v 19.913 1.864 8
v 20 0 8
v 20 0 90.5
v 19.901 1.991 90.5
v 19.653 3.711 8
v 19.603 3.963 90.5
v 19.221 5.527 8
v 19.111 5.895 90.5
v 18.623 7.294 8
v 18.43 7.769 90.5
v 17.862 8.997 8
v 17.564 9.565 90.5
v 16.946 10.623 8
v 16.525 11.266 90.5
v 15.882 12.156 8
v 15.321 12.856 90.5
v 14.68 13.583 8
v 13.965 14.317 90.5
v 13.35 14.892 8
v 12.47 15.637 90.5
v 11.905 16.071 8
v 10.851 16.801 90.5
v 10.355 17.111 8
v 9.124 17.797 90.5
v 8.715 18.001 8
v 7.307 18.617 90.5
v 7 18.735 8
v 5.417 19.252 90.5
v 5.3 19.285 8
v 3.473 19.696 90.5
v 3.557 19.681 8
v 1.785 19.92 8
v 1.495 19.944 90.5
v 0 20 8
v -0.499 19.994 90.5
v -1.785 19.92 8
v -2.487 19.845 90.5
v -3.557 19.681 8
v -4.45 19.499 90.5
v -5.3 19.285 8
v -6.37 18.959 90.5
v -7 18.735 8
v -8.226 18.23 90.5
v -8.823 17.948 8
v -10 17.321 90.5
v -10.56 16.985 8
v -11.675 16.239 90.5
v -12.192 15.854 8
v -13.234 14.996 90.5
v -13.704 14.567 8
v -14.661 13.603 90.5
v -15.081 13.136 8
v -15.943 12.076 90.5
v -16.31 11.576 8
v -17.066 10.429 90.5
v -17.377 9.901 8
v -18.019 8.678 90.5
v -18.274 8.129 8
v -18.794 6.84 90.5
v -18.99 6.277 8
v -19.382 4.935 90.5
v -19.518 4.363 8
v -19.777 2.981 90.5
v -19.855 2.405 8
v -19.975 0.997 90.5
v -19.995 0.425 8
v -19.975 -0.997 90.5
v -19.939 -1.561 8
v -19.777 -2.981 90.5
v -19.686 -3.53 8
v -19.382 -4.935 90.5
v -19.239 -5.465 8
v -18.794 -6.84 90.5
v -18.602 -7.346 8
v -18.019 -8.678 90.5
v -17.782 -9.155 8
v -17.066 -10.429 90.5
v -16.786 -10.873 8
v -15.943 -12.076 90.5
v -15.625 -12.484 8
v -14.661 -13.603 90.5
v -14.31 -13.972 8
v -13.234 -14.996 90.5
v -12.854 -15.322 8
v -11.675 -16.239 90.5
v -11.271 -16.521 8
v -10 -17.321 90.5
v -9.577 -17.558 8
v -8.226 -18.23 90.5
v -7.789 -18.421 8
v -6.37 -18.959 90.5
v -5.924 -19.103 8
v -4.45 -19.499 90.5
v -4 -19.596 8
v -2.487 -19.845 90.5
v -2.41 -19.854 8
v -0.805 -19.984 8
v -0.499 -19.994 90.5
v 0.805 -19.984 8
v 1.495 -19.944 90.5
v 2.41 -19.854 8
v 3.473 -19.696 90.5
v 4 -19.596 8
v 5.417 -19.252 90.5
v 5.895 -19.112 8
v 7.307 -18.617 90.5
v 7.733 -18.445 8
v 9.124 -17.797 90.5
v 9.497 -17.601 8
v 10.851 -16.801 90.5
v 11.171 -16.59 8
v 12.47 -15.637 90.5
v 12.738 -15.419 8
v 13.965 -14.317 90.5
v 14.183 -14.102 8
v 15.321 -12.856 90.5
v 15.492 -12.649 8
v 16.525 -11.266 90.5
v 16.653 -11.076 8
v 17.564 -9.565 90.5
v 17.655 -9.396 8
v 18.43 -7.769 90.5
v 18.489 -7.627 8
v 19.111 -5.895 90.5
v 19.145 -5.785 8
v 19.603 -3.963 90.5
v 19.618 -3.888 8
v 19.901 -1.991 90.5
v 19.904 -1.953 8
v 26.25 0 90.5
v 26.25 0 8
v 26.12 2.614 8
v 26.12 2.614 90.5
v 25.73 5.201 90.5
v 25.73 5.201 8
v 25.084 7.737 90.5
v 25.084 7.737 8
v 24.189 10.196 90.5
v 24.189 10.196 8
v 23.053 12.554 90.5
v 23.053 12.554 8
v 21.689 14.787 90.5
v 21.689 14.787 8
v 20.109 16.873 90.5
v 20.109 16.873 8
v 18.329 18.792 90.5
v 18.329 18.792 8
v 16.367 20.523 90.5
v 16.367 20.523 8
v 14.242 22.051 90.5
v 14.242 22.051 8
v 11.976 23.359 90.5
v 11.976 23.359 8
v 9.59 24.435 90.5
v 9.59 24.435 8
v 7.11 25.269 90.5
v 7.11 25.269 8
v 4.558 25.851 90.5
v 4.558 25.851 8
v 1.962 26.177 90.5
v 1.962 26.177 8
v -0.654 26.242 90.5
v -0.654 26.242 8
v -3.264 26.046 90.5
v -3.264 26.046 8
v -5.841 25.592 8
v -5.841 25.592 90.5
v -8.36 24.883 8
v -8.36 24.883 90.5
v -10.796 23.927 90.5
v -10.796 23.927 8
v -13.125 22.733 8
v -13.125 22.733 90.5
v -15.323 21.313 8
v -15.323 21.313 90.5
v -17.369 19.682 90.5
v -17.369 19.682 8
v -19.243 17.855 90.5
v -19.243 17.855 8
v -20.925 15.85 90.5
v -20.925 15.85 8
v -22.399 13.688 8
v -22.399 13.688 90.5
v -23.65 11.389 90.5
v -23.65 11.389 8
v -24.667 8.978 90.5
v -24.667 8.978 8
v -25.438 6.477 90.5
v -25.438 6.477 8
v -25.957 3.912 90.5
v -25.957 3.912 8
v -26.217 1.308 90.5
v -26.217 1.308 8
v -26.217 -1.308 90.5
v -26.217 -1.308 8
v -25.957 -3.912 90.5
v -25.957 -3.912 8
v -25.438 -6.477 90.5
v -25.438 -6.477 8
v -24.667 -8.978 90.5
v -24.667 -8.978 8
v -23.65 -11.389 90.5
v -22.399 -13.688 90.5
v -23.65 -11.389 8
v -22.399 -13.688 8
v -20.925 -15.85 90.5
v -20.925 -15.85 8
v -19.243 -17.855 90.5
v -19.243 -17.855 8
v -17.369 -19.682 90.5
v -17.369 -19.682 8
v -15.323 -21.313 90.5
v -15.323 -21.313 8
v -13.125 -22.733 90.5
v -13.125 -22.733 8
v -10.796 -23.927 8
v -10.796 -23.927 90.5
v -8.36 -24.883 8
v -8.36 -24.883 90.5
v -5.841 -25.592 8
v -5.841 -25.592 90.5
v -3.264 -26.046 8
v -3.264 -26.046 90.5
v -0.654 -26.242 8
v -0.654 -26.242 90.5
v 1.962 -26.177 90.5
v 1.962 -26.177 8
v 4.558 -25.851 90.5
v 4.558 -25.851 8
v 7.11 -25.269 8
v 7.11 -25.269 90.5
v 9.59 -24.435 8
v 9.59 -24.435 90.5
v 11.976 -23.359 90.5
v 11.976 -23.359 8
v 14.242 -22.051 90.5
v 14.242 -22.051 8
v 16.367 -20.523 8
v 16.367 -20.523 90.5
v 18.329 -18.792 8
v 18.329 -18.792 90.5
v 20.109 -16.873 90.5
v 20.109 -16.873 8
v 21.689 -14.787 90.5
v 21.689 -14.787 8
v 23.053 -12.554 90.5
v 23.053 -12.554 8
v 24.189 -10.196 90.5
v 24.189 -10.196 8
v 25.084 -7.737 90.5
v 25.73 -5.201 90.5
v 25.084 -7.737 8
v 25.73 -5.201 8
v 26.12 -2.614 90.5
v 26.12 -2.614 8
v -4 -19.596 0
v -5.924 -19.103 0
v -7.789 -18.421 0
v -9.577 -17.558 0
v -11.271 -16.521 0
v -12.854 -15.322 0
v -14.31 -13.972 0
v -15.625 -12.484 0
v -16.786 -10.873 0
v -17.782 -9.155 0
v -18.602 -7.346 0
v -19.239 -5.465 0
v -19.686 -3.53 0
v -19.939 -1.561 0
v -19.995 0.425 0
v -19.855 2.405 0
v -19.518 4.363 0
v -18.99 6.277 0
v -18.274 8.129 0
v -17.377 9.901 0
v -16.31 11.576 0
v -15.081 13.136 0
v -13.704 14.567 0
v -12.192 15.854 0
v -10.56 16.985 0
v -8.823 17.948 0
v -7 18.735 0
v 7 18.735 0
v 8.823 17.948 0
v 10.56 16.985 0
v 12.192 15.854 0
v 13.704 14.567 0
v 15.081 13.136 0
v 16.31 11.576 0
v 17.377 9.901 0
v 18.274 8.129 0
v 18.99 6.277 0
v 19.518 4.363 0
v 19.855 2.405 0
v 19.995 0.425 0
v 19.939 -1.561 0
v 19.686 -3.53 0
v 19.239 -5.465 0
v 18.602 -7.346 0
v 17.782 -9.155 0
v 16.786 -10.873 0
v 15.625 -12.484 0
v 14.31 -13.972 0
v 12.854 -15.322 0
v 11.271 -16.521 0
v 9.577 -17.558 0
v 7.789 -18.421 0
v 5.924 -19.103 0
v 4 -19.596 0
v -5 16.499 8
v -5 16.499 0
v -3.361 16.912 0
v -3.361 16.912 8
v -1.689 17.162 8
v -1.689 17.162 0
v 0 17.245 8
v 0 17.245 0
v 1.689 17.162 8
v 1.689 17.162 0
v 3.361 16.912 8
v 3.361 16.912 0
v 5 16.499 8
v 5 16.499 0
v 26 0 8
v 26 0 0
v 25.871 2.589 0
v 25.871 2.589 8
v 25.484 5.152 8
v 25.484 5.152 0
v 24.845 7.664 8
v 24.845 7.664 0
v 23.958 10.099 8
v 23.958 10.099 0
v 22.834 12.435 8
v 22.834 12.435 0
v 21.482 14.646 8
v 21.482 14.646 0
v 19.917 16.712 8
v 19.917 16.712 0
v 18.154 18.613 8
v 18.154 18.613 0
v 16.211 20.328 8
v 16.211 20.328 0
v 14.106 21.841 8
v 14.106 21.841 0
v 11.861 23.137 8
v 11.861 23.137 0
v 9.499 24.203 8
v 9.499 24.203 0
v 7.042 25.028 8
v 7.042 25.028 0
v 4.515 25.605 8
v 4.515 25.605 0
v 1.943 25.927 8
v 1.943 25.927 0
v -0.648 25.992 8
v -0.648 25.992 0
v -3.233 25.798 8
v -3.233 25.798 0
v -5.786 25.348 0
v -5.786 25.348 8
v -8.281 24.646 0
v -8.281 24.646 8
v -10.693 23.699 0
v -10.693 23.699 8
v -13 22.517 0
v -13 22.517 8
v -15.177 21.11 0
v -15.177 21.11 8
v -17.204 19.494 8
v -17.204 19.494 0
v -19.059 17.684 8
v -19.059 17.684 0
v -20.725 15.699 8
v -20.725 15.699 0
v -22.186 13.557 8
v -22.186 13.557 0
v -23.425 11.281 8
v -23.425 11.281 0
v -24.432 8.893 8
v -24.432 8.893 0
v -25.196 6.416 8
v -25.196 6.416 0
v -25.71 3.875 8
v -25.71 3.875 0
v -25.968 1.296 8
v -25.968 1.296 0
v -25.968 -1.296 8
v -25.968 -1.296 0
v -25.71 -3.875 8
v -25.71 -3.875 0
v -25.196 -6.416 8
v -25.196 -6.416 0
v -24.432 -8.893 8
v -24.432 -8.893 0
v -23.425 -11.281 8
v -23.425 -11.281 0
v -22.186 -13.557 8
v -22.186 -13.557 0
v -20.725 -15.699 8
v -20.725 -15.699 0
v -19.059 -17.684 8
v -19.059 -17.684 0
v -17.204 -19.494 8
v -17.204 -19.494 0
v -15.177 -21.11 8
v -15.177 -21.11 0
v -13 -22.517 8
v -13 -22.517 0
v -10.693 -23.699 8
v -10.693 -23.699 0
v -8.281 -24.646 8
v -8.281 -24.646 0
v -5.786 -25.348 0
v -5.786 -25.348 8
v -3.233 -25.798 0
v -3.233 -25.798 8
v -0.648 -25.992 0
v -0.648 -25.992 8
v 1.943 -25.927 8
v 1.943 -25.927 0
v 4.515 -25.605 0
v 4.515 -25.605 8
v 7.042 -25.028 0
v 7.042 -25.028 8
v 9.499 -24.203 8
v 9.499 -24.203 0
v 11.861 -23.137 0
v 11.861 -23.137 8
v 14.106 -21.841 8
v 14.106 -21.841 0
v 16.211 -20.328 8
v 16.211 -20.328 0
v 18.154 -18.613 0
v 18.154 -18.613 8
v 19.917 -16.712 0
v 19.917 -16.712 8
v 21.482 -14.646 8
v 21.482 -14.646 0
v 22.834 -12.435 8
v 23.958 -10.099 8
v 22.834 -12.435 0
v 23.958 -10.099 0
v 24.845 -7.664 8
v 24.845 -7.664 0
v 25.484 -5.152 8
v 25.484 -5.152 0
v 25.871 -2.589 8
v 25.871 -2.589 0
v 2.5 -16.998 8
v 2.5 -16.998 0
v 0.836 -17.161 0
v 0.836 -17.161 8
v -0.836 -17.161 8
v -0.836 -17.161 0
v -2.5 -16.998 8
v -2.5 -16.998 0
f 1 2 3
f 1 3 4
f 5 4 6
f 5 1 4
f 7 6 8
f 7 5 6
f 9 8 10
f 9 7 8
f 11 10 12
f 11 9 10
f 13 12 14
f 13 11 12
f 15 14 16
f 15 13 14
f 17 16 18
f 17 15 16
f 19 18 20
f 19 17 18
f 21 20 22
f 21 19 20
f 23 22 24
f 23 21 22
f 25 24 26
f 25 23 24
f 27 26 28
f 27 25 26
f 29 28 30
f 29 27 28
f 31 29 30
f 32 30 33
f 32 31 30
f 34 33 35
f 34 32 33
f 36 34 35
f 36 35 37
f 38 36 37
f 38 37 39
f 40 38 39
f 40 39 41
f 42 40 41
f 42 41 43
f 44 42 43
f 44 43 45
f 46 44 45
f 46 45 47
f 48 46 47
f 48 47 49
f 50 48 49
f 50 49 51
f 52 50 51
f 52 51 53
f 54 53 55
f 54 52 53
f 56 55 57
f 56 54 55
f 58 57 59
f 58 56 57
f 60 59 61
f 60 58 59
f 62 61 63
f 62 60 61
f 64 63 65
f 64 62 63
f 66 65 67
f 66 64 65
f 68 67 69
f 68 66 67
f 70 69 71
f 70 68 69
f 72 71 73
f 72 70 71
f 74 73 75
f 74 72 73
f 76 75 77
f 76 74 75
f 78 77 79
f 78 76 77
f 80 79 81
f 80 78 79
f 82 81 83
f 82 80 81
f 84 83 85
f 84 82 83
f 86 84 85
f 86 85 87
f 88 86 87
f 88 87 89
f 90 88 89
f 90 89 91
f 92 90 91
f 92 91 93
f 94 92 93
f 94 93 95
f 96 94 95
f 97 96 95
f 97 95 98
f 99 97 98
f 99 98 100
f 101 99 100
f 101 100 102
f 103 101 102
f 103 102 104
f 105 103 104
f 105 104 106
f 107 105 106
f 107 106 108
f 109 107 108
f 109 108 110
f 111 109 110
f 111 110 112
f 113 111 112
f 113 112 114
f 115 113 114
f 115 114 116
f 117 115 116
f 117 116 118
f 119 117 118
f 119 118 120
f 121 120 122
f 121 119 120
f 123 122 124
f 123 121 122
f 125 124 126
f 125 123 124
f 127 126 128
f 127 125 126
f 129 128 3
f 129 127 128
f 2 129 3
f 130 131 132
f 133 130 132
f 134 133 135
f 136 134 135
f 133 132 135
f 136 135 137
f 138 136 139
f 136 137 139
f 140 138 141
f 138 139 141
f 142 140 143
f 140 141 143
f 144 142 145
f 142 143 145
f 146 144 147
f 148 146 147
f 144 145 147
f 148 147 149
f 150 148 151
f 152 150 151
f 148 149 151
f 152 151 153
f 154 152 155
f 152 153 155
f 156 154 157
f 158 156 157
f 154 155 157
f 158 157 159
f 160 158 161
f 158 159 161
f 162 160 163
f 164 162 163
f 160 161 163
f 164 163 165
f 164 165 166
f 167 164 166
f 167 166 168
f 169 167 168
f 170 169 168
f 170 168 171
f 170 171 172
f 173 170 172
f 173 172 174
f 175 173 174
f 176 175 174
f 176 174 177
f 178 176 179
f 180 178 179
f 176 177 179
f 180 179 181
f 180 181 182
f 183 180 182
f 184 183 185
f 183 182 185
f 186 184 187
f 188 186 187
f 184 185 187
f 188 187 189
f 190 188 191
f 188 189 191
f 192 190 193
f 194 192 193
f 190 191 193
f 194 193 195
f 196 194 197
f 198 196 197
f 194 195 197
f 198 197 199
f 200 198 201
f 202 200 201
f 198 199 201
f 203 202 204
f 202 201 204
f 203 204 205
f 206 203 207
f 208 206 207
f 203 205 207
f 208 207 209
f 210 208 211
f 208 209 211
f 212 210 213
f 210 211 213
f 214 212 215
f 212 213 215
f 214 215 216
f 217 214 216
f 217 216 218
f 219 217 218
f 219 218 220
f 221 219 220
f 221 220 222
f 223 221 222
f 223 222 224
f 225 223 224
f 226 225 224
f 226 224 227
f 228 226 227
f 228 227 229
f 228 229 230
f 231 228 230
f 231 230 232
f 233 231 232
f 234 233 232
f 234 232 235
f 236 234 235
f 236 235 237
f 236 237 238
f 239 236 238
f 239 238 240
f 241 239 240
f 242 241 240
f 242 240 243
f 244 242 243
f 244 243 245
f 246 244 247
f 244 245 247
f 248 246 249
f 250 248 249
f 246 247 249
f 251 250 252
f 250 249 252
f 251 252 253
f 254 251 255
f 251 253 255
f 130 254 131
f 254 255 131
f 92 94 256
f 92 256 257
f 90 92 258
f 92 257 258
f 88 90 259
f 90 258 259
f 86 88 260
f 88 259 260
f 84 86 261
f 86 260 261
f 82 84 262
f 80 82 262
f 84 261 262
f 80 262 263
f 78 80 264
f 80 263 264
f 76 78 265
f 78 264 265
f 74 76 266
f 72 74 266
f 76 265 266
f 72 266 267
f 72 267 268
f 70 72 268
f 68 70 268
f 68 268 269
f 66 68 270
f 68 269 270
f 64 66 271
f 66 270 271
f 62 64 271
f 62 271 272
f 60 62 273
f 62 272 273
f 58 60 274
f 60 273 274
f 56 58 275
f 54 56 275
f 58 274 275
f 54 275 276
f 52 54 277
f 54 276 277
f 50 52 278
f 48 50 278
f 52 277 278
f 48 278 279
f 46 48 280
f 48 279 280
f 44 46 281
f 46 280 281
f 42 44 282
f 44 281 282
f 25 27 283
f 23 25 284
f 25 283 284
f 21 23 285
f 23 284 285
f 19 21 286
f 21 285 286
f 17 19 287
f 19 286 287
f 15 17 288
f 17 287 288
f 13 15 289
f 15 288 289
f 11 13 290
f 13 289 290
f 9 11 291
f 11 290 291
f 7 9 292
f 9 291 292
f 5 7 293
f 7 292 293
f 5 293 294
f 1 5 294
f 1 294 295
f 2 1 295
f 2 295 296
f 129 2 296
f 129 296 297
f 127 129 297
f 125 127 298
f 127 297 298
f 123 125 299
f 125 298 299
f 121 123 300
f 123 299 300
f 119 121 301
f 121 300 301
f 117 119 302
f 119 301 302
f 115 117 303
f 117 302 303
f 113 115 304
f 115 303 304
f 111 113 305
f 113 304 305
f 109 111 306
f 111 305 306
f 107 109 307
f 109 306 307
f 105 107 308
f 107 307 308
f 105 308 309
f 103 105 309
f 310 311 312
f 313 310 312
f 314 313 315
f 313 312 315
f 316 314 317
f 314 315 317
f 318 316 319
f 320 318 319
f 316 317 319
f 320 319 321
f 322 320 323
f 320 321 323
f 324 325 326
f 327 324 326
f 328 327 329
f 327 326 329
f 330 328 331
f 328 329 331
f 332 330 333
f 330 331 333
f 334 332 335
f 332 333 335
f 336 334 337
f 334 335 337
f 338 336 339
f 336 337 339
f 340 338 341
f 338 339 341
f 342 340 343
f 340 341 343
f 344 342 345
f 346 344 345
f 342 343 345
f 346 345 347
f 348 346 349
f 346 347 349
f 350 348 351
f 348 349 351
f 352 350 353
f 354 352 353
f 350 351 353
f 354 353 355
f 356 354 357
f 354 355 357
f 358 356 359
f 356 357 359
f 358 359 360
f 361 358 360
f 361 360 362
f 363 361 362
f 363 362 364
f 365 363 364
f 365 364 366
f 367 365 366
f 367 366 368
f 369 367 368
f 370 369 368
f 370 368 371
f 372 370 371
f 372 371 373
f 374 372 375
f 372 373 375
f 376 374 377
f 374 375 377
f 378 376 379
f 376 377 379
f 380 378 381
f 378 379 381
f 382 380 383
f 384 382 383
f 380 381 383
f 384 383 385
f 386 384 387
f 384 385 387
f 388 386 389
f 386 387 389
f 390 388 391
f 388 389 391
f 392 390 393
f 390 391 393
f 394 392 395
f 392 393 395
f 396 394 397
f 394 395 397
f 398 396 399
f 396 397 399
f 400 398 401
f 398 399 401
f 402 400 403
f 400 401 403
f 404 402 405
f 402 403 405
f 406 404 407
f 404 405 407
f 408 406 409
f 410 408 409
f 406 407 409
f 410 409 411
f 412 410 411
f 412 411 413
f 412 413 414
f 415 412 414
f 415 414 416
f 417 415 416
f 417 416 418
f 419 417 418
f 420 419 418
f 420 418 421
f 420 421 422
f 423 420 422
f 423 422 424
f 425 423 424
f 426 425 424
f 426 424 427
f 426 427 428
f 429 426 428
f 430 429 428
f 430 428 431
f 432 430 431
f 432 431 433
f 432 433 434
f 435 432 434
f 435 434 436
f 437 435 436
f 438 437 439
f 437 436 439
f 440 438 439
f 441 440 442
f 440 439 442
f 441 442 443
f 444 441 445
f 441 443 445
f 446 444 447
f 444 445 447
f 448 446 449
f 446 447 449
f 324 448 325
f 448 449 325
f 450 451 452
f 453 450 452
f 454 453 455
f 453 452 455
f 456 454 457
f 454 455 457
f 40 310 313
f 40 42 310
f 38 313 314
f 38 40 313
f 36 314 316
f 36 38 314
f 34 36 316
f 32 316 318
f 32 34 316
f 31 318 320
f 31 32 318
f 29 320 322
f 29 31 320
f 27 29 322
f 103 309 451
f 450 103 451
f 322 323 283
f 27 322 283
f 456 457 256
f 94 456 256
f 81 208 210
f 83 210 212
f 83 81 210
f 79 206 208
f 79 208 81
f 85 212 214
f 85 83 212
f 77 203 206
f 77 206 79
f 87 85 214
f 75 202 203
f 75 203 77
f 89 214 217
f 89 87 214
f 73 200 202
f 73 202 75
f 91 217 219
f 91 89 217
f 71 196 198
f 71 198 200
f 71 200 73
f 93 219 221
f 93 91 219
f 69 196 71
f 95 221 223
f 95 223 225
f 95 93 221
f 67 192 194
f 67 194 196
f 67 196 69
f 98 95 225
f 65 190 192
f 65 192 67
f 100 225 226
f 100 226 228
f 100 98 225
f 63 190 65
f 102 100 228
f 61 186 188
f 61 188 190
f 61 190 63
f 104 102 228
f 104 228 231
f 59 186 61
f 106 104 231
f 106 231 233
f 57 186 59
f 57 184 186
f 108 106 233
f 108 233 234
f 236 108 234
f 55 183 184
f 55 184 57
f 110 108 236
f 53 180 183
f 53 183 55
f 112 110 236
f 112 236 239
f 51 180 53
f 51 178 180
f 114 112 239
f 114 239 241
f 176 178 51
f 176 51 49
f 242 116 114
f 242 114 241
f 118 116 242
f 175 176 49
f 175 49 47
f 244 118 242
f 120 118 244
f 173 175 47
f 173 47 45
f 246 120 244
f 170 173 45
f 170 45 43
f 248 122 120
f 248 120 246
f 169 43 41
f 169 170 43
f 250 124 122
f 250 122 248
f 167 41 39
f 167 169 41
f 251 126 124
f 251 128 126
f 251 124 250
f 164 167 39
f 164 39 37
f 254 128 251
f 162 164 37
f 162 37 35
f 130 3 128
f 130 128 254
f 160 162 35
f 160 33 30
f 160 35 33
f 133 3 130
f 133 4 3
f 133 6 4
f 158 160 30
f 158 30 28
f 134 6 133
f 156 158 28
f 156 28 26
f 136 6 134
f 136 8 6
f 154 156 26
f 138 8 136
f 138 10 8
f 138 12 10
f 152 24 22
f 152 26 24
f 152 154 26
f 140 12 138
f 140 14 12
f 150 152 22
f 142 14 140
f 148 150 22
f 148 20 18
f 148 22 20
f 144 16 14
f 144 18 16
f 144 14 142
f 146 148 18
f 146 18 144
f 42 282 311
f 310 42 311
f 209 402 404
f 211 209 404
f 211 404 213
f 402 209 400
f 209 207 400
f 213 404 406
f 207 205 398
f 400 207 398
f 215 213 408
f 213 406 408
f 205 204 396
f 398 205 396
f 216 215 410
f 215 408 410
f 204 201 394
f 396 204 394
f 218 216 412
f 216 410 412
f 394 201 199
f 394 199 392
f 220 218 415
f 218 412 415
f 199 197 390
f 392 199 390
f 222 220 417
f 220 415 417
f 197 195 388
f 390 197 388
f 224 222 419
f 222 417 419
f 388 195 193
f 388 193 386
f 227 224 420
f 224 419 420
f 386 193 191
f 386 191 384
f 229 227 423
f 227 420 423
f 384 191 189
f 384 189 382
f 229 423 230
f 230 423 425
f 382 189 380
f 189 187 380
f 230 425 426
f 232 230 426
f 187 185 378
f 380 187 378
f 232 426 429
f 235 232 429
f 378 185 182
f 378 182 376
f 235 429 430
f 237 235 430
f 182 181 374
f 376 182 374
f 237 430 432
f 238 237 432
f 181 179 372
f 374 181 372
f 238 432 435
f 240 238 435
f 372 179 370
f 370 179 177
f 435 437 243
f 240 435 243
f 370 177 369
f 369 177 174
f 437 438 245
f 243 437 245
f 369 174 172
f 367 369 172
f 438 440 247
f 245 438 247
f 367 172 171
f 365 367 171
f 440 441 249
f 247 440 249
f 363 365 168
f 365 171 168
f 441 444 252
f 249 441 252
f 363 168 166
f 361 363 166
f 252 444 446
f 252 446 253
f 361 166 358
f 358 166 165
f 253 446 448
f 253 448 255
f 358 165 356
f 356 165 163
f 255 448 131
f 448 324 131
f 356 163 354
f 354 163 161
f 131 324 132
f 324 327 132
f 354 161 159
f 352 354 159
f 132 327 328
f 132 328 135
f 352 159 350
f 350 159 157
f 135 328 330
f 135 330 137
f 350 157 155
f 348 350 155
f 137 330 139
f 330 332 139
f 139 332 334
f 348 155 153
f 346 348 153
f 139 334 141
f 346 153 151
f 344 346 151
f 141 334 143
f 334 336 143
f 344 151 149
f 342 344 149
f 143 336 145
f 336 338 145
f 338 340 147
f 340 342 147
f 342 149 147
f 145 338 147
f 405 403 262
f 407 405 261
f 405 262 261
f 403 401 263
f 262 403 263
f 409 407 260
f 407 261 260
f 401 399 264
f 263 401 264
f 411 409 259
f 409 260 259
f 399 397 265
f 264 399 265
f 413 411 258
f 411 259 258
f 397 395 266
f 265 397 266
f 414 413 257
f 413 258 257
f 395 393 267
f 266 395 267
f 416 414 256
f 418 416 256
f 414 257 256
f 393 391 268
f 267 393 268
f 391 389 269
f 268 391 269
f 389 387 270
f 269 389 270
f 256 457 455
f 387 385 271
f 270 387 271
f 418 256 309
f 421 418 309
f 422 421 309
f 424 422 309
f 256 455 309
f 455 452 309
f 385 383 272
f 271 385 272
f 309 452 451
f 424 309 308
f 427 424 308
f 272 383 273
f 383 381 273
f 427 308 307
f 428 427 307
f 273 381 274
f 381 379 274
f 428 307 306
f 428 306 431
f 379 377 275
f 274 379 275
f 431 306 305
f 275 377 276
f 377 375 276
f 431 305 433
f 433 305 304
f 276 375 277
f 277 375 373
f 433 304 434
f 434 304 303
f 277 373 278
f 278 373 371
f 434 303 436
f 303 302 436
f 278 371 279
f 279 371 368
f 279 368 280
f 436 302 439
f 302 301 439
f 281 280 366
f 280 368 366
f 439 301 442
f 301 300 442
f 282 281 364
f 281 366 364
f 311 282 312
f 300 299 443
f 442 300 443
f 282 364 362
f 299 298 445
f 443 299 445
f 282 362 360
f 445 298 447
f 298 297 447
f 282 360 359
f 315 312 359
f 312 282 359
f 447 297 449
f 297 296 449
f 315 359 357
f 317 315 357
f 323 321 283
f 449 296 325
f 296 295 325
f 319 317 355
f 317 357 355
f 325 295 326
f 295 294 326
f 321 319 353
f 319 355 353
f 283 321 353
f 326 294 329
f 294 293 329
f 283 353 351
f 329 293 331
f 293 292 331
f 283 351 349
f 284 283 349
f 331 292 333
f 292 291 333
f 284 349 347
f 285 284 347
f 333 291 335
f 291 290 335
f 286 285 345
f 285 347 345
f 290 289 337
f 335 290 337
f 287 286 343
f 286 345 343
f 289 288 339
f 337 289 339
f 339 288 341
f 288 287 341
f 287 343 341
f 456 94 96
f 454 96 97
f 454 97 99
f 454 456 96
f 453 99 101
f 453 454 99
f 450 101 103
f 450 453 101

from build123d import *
from build123d import SkipClean  # not in build123d's __all__

# Parameters (mm, degrees)
F0_R     = 26
F1_DEPTH = 8
F2_R     = 26.25
F2_R_2   = 20
F3_DEPTH = 82.5


with BuildPart() as f1:
    # F0 (on Top) → F1 (new body)
    with BuildSketch(Plane.XY):
        Circle(F0_R)
        with BuildLine():
            ThreePointArc((7, 18.7349939952), (19.9390246123, -1.5605439791), (4, -19.5959179423))
            Line((4, -19.5959179423), (2.5, -16.9978417309))
            ThreePointArc((2.5, -16.9978417309), (0, -17.1816769299), (-2.5, -16.9978417309))
            Line((-2.5, -16.9978417309), (-4, -19.5959179423))
            ThreePointArc((-4, -19.5959179423), (-19.9390246123, -1.5605439791), (-7, 18.7349939952))
            Line((-7, 18.7349939952), (-5, 16.4989260177))
            ThreePointArc((-5, 16.4989260177), (0, 17.2452185999), (5, 16.4989260177))
            Line((5, 16.4989260177), (7, 18.7349939952))
        make_face(mode=Mode.SUBTRACT)
    extrude(amount=F1_DEPTH)

    # F2 (on face) → F3 (join)
    with BuildSketch(Plane.XY.offset(8)):
        Circle(F2_R)
        Circle(F2_R_2, mode=Mode.SUBTRACT)
    with SkipClean():  # cleaning this boolean's faces spoils the solid; the shape is the same uncleaned
        extrude(amount=F3_DEPTH)


solid = f1.part
